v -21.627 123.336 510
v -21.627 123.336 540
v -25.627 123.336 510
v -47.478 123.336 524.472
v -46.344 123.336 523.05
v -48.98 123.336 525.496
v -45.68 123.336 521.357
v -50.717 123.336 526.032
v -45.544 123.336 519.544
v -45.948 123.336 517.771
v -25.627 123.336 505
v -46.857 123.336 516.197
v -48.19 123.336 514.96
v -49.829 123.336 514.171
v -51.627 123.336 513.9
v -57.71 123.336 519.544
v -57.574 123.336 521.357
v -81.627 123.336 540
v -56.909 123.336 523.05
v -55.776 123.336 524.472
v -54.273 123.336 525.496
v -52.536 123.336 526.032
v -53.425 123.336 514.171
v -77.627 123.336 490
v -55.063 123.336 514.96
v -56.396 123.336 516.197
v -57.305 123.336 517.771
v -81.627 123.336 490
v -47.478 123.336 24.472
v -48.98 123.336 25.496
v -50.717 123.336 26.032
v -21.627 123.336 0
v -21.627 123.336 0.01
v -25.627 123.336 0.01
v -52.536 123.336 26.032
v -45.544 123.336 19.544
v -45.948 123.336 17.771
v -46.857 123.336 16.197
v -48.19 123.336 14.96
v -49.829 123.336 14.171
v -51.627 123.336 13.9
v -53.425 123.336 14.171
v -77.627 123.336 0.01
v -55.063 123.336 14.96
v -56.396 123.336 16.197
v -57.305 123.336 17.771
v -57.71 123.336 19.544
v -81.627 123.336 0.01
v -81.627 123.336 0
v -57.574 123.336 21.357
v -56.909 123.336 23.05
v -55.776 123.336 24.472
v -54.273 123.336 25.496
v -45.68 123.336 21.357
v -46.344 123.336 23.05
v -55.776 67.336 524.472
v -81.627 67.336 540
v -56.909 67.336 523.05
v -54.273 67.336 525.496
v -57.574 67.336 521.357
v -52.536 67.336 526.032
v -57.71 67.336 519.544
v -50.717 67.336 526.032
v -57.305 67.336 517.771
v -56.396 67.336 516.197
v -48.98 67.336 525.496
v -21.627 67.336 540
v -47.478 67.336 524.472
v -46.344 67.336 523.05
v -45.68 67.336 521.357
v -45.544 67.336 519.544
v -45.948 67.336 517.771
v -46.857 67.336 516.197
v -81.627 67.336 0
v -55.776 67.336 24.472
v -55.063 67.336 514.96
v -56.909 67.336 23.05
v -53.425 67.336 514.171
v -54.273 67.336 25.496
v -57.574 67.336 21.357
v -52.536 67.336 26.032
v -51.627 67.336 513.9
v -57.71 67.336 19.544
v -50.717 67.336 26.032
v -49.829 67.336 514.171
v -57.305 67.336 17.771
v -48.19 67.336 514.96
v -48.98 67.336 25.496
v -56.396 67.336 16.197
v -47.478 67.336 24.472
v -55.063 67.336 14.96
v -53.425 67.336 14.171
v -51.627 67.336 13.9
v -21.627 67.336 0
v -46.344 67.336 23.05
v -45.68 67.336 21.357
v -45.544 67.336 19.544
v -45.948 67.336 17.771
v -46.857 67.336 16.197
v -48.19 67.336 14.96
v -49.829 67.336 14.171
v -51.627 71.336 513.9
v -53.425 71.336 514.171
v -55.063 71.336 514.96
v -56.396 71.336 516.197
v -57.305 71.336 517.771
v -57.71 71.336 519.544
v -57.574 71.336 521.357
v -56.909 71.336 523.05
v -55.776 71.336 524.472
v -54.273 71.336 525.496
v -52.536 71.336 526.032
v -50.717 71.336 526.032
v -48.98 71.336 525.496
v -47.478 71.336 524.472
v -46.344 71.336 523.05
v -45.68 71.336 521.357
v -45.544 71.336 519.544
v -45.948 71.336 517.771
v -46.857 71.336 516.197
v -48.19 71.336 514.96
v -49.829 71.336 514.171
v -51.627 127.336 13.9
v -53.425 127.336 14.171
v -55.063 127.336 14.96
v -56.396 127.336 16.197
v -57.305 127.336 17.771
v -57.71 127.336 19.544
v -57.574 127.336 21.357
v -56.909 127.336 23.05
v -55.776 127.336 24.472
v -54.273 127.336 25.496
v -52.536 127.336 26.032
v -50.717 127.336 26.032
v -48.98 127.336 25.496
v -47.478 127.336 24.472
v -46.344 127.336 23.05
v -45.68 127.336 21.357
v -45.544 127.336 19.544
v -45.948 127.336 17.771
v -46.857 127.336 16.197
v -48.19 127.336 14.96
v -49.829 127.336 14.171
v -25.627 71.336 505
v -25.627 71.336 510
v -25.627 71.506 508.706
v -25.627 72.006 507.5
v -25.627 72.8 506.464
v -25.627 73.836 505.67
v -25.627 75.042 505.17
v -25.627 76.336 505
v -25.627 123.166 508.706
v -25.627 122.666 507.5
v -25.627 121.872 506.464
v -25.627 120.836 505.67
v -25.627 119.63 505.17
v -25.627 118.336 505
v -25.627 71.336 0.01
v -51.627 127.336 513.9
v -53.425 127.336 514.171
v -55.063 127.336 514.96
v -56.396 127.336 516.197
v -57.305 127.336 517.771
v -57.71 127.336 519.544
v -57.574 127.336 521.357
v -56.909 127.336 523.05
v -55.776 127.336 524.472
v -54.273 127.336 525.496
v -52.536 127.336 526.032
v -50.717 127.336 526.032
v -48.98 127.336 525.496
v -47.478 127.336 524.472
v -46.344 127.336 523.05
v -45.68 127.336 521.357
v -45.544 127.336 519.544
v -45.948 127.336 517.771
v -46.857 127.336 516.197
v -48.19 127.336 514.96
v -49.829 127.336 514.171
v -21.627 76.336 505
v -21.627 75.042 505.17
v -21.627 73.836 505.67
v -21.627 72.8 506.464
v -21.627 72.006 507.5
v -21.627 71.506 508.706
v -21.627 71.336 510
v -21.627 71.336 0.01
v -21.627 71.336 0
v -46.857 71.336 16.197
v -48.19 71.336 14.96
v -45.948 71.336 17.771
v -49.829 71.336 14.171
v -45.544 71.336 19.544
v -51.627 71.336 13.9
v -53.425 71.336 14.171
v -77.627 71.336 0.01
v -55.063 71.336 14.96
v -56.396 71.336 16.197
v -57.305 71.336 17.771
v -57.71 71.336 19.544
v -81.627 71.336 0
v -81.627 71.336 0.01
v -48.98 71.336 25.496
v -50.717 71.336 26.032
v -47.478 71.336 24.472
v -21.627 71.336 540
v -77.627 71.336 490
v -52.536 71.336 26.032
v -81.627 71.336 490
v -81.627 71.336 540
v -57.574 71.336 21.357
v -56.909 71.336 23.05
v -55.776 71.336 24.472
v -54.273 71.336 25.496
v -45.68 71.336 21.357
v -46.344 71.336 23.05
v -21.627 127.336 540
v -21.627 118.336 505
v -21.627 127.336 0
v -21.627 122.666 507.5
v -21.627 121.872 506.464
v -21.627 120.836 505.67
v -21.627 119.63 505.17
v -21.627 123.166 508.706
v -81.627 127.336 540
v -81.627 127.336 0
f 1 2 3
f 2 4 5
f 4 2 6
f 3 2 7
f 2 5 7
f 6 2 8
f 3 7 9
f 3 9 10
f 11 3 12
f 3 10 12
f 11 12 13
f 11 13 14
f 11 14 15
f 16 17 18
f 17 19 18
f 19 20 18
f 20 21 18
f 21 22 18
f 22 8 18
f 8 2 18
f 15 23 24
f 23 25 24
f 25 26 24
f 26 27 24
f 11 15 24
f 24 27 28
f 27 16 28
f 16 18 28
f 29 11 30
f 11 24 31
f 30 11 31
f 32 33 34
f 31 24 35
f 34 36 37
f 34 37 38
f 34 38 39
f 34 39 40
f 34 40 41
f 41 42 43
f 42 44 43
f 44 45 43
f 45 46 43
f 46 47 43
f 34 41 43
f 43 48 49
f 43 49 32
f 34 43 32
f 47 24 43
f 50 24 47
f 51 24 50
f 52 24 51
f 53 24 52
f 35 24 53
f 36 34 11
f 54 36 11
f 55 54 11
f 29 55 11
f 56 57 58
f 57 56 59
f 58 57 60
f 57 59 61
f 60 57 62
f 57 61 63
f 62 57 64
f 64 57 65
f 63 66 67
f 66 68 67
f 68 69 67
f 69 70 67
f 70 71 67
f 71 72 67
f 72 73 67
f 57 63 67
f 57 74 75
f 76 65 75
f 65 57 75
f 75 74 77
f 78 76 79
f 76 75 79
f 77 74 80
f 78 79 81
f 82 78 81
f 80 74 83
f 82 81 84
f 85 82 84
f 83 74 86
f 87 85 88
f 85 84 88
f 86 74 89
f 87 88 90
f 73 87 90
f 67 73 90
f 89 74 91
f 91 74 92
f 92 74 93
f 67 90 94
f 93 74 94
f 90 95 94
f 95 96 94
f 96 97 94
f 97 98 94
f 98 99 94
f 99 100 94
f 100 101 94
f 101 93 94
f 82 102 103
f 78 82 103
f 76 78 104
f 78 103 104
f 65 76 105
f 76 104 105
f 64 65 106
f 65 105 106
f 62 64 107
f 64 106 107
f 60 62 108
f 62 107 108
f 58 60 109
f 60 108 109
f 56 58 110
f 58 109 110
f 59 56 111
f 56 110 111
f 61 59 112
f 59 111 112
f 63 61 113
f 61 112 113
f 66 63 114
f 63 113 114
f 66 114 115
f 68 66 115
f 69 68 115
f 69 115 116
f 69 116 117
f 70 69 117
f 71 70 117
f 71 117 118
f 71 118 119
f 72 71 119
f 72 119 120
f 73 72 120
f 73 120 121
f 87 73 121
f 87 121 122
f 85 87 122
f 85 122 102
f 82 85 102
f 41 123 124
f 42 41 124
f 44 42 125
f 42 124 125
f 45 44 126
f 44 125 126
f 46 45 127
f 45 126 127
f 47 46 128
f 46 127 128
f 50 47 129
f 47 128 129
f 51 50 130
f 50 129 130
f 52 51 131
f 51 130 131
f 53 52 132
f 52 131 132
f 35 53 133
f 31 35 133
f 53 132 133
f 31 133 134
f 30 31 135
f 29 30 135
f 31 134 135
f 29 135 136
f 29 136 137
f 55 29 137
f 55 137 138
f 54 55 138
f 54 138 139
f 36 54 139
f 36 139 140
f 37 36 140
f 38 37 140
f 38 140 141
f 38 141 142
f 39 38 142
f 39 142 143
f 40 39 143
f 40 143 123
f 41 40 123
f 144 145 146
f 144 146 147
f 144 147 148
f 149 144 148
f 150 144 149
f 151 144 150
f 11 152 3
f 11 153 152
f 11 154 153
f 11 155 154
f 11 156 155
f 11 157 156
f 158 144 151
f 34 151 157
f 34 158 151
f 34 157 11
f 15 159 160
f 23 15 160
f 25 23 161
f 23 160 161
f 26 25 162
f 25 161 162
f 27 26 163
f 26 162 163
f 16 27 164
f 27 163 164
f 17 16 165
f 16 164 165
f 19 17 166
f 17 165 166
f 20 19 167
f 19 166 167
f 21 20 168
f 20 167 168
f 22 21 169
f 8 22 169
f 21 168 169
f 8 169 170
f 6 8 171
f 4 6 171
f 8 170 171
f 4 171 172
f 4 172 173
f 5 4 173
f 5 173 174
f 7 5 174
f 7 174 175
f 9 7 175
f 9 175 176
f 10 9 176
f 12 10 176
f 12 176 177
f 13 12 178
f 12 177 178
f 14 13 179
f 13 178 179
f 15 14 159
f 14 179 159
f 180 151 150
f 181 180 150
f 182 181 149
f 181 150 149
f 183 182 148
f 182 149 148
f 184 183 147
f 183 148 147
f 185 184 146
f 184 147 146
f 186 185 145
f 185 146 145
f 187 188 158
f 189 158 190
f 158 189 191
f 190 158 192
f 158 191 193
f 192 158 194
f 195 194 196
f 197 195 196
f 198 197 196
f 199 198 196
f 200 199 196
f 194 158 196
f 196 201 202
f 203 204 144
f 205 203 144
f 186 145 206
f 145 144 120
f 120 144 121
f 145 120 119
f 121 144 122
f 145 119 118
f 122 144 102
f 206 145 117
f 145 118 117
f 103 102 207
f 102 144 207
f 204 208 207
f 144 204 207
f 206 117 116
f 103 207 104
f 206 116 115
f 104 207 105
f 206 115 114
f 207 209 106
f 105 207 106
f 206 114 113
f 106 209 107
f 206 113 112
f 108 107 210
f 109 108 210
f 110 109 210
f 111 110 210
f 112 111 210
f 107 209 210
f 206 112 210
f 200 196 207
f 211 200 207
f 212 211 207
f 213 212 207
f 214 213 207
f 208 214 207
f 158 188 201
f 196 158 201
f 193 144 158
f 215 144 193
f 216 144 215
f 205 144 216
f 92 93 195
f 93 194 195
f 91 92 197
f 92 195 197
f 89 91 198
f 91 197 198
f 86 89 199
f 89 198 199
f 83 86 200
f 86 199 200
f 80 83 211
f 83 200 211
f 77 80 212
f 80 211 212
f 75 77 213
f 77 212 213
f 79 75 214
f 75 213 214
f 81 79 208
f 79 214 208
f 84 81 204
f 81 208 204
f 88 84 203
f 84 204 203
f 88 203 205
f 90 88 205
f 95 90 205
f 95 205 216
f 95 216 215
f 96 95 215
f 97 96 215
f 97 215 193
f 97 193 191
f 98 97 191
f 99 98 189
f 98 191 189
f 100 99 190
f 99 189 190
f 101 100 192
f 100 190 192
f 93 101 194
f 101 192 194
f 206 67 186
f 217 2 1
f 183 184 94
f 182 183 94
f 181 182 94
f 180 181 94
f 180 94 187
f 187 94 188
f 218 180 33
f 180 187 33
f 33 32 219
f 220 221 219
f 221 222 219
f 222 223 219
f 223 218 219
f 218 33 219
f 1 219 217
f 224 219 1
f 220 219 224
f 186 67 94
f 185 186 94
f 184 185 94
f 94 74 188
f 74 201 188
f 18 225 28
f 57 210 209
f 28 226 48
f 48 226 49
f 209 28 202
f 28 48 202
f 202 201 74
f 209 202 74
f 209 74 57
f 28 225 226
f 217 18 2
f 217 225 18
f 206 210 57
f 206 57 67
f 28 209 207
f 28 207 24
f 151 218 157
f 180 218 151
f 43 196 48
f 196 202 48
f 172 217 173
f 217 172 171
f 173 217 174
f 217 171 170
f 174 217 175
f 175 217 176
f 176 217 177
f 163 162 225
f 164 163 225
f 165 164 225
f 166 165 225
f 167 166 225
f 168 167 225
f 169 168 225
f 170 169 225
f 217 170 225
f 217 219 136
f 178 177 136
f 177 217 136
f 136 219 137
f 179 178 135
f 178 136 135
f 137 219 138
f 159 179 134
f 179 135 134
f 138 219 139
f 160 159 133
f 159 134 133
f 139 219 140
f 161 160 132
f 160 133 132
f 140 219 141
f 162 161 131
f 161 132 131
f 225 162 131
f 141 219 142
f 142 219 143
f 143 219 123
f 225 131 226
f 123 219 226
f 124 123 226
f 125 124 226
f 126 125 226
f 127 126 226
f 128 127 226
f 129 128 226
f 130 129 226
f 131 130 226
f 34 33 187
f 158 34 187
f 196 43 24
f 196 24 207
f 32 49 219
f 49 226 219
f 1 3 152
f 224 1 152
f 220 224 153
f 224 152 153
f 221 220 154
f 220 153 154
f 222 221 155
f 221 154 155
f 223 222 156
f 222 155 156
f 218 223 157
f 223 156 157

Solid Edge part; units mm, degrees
sketch "Sketch1" plane through (0, 0, 0) normal (0, 0, 1) x (1, 0, 0)
  line L0 (-81.6266, 67.336) -> (-21.6266, 67.336)
  line L1 (-21.6266, 67.336) -> (-21.6266, 127.336)
  line L2 (-21.6266, 127.336) -> (-81.6266, 127.336)
  line L3 (-81.6266, 127.336) -> (-81.6266, 67.336)
  line L4 (-77.6266, 71.336) -> (-25.6266, 71.336)
  line L5 (-25.6266, 71.336) -> (-25.6266, 123.336)
  line L6 (-25.6266, 123.336) -> (-77.6266, 123.336)
  line L7 (-77.6266, 123.336) -> (-77.6266, 71.336)
  dimension "D1" = 21.6266
  dimension "D2" = 81.6266
extrude "Protrusion1" add sketch "Sketch1" along normal blind 540
sketch "Sketch2" plane through (-56.6266, 127.336, 367.5) normal (0, 1, 0) x (0, 0, -1)
  circle A0 centre (347.5, -5) radius 6.1
  circle A1 centre (-152.5, -5) radius 6.1
extrude "Cutout1" cut sketch "Sketch2" against normal through all
sketch "Sketch3" plane through (-21.6266, 92.336, 367.5) normal (1, 0, 0) x (0, 0, -1)
  line L0 (367.49, -21) -> (367.5, -21)
  line L1 (367.5, -21) -> (367.5, 31)
  line L2 (367.5, 31) -> (367.49, 31)
  line L3 (367.49, 31) -> (367.49, -21)
  line L4 (-172.5, 31) -> (-137.5, 31)
  line L5 (-137.5, 31) -> (-137.5, -21)
  line L6 (-137.5, -21) -> (-172.5, -21)
  line L7 (-172.5, -21) -> (-172.5, 31)
  dimension "D1" = 172.5
  dimension "D2" = 137.5
  dimension "D3" = 367.49
  dimension "D4" = 367.49
extrude "Cutout2" cut sketch "Sketch3" against normal blind 5
sketch "Sketch4" plane through (-81.6266, 92.336, 367.5) normal (-1, 0, 0) x (0, 0, -1)
  line L0 (367.49, -31) -> (367.5, -31)
  line L1 (367.5, -31) -> (367.5, 21)
  line L2 (367.5, 21) -> (367.49, 21)
  line L3 (367.49, 21) -> (367.49, -31)
  line L4 (-172.5, 21) -> (-122.5, 21)
  line L5 (-122.5, 21) -> (-122.5, -31)
  line L6 (-122.5, -31) -> (-172.5, -31)
  line L7 (-172.5, -31) -> (-172.5, 21)
  dimension "D1" = 172.5
  dimension "D2" = 122.5
  dimension "D3" = 367.5
  dimension "D4" = 367.49
extrude "ExtrudedCutout_3" cut sketch "Sketch4" against normal blind 5
extrude "Cutout3" [suppressed]
fillet "Round1" radius 5 2 edges at (-23.6266, 123.336, 505) (-23.6266, 71.336, 505)
properties material "Aluminum, 6061-T6"
